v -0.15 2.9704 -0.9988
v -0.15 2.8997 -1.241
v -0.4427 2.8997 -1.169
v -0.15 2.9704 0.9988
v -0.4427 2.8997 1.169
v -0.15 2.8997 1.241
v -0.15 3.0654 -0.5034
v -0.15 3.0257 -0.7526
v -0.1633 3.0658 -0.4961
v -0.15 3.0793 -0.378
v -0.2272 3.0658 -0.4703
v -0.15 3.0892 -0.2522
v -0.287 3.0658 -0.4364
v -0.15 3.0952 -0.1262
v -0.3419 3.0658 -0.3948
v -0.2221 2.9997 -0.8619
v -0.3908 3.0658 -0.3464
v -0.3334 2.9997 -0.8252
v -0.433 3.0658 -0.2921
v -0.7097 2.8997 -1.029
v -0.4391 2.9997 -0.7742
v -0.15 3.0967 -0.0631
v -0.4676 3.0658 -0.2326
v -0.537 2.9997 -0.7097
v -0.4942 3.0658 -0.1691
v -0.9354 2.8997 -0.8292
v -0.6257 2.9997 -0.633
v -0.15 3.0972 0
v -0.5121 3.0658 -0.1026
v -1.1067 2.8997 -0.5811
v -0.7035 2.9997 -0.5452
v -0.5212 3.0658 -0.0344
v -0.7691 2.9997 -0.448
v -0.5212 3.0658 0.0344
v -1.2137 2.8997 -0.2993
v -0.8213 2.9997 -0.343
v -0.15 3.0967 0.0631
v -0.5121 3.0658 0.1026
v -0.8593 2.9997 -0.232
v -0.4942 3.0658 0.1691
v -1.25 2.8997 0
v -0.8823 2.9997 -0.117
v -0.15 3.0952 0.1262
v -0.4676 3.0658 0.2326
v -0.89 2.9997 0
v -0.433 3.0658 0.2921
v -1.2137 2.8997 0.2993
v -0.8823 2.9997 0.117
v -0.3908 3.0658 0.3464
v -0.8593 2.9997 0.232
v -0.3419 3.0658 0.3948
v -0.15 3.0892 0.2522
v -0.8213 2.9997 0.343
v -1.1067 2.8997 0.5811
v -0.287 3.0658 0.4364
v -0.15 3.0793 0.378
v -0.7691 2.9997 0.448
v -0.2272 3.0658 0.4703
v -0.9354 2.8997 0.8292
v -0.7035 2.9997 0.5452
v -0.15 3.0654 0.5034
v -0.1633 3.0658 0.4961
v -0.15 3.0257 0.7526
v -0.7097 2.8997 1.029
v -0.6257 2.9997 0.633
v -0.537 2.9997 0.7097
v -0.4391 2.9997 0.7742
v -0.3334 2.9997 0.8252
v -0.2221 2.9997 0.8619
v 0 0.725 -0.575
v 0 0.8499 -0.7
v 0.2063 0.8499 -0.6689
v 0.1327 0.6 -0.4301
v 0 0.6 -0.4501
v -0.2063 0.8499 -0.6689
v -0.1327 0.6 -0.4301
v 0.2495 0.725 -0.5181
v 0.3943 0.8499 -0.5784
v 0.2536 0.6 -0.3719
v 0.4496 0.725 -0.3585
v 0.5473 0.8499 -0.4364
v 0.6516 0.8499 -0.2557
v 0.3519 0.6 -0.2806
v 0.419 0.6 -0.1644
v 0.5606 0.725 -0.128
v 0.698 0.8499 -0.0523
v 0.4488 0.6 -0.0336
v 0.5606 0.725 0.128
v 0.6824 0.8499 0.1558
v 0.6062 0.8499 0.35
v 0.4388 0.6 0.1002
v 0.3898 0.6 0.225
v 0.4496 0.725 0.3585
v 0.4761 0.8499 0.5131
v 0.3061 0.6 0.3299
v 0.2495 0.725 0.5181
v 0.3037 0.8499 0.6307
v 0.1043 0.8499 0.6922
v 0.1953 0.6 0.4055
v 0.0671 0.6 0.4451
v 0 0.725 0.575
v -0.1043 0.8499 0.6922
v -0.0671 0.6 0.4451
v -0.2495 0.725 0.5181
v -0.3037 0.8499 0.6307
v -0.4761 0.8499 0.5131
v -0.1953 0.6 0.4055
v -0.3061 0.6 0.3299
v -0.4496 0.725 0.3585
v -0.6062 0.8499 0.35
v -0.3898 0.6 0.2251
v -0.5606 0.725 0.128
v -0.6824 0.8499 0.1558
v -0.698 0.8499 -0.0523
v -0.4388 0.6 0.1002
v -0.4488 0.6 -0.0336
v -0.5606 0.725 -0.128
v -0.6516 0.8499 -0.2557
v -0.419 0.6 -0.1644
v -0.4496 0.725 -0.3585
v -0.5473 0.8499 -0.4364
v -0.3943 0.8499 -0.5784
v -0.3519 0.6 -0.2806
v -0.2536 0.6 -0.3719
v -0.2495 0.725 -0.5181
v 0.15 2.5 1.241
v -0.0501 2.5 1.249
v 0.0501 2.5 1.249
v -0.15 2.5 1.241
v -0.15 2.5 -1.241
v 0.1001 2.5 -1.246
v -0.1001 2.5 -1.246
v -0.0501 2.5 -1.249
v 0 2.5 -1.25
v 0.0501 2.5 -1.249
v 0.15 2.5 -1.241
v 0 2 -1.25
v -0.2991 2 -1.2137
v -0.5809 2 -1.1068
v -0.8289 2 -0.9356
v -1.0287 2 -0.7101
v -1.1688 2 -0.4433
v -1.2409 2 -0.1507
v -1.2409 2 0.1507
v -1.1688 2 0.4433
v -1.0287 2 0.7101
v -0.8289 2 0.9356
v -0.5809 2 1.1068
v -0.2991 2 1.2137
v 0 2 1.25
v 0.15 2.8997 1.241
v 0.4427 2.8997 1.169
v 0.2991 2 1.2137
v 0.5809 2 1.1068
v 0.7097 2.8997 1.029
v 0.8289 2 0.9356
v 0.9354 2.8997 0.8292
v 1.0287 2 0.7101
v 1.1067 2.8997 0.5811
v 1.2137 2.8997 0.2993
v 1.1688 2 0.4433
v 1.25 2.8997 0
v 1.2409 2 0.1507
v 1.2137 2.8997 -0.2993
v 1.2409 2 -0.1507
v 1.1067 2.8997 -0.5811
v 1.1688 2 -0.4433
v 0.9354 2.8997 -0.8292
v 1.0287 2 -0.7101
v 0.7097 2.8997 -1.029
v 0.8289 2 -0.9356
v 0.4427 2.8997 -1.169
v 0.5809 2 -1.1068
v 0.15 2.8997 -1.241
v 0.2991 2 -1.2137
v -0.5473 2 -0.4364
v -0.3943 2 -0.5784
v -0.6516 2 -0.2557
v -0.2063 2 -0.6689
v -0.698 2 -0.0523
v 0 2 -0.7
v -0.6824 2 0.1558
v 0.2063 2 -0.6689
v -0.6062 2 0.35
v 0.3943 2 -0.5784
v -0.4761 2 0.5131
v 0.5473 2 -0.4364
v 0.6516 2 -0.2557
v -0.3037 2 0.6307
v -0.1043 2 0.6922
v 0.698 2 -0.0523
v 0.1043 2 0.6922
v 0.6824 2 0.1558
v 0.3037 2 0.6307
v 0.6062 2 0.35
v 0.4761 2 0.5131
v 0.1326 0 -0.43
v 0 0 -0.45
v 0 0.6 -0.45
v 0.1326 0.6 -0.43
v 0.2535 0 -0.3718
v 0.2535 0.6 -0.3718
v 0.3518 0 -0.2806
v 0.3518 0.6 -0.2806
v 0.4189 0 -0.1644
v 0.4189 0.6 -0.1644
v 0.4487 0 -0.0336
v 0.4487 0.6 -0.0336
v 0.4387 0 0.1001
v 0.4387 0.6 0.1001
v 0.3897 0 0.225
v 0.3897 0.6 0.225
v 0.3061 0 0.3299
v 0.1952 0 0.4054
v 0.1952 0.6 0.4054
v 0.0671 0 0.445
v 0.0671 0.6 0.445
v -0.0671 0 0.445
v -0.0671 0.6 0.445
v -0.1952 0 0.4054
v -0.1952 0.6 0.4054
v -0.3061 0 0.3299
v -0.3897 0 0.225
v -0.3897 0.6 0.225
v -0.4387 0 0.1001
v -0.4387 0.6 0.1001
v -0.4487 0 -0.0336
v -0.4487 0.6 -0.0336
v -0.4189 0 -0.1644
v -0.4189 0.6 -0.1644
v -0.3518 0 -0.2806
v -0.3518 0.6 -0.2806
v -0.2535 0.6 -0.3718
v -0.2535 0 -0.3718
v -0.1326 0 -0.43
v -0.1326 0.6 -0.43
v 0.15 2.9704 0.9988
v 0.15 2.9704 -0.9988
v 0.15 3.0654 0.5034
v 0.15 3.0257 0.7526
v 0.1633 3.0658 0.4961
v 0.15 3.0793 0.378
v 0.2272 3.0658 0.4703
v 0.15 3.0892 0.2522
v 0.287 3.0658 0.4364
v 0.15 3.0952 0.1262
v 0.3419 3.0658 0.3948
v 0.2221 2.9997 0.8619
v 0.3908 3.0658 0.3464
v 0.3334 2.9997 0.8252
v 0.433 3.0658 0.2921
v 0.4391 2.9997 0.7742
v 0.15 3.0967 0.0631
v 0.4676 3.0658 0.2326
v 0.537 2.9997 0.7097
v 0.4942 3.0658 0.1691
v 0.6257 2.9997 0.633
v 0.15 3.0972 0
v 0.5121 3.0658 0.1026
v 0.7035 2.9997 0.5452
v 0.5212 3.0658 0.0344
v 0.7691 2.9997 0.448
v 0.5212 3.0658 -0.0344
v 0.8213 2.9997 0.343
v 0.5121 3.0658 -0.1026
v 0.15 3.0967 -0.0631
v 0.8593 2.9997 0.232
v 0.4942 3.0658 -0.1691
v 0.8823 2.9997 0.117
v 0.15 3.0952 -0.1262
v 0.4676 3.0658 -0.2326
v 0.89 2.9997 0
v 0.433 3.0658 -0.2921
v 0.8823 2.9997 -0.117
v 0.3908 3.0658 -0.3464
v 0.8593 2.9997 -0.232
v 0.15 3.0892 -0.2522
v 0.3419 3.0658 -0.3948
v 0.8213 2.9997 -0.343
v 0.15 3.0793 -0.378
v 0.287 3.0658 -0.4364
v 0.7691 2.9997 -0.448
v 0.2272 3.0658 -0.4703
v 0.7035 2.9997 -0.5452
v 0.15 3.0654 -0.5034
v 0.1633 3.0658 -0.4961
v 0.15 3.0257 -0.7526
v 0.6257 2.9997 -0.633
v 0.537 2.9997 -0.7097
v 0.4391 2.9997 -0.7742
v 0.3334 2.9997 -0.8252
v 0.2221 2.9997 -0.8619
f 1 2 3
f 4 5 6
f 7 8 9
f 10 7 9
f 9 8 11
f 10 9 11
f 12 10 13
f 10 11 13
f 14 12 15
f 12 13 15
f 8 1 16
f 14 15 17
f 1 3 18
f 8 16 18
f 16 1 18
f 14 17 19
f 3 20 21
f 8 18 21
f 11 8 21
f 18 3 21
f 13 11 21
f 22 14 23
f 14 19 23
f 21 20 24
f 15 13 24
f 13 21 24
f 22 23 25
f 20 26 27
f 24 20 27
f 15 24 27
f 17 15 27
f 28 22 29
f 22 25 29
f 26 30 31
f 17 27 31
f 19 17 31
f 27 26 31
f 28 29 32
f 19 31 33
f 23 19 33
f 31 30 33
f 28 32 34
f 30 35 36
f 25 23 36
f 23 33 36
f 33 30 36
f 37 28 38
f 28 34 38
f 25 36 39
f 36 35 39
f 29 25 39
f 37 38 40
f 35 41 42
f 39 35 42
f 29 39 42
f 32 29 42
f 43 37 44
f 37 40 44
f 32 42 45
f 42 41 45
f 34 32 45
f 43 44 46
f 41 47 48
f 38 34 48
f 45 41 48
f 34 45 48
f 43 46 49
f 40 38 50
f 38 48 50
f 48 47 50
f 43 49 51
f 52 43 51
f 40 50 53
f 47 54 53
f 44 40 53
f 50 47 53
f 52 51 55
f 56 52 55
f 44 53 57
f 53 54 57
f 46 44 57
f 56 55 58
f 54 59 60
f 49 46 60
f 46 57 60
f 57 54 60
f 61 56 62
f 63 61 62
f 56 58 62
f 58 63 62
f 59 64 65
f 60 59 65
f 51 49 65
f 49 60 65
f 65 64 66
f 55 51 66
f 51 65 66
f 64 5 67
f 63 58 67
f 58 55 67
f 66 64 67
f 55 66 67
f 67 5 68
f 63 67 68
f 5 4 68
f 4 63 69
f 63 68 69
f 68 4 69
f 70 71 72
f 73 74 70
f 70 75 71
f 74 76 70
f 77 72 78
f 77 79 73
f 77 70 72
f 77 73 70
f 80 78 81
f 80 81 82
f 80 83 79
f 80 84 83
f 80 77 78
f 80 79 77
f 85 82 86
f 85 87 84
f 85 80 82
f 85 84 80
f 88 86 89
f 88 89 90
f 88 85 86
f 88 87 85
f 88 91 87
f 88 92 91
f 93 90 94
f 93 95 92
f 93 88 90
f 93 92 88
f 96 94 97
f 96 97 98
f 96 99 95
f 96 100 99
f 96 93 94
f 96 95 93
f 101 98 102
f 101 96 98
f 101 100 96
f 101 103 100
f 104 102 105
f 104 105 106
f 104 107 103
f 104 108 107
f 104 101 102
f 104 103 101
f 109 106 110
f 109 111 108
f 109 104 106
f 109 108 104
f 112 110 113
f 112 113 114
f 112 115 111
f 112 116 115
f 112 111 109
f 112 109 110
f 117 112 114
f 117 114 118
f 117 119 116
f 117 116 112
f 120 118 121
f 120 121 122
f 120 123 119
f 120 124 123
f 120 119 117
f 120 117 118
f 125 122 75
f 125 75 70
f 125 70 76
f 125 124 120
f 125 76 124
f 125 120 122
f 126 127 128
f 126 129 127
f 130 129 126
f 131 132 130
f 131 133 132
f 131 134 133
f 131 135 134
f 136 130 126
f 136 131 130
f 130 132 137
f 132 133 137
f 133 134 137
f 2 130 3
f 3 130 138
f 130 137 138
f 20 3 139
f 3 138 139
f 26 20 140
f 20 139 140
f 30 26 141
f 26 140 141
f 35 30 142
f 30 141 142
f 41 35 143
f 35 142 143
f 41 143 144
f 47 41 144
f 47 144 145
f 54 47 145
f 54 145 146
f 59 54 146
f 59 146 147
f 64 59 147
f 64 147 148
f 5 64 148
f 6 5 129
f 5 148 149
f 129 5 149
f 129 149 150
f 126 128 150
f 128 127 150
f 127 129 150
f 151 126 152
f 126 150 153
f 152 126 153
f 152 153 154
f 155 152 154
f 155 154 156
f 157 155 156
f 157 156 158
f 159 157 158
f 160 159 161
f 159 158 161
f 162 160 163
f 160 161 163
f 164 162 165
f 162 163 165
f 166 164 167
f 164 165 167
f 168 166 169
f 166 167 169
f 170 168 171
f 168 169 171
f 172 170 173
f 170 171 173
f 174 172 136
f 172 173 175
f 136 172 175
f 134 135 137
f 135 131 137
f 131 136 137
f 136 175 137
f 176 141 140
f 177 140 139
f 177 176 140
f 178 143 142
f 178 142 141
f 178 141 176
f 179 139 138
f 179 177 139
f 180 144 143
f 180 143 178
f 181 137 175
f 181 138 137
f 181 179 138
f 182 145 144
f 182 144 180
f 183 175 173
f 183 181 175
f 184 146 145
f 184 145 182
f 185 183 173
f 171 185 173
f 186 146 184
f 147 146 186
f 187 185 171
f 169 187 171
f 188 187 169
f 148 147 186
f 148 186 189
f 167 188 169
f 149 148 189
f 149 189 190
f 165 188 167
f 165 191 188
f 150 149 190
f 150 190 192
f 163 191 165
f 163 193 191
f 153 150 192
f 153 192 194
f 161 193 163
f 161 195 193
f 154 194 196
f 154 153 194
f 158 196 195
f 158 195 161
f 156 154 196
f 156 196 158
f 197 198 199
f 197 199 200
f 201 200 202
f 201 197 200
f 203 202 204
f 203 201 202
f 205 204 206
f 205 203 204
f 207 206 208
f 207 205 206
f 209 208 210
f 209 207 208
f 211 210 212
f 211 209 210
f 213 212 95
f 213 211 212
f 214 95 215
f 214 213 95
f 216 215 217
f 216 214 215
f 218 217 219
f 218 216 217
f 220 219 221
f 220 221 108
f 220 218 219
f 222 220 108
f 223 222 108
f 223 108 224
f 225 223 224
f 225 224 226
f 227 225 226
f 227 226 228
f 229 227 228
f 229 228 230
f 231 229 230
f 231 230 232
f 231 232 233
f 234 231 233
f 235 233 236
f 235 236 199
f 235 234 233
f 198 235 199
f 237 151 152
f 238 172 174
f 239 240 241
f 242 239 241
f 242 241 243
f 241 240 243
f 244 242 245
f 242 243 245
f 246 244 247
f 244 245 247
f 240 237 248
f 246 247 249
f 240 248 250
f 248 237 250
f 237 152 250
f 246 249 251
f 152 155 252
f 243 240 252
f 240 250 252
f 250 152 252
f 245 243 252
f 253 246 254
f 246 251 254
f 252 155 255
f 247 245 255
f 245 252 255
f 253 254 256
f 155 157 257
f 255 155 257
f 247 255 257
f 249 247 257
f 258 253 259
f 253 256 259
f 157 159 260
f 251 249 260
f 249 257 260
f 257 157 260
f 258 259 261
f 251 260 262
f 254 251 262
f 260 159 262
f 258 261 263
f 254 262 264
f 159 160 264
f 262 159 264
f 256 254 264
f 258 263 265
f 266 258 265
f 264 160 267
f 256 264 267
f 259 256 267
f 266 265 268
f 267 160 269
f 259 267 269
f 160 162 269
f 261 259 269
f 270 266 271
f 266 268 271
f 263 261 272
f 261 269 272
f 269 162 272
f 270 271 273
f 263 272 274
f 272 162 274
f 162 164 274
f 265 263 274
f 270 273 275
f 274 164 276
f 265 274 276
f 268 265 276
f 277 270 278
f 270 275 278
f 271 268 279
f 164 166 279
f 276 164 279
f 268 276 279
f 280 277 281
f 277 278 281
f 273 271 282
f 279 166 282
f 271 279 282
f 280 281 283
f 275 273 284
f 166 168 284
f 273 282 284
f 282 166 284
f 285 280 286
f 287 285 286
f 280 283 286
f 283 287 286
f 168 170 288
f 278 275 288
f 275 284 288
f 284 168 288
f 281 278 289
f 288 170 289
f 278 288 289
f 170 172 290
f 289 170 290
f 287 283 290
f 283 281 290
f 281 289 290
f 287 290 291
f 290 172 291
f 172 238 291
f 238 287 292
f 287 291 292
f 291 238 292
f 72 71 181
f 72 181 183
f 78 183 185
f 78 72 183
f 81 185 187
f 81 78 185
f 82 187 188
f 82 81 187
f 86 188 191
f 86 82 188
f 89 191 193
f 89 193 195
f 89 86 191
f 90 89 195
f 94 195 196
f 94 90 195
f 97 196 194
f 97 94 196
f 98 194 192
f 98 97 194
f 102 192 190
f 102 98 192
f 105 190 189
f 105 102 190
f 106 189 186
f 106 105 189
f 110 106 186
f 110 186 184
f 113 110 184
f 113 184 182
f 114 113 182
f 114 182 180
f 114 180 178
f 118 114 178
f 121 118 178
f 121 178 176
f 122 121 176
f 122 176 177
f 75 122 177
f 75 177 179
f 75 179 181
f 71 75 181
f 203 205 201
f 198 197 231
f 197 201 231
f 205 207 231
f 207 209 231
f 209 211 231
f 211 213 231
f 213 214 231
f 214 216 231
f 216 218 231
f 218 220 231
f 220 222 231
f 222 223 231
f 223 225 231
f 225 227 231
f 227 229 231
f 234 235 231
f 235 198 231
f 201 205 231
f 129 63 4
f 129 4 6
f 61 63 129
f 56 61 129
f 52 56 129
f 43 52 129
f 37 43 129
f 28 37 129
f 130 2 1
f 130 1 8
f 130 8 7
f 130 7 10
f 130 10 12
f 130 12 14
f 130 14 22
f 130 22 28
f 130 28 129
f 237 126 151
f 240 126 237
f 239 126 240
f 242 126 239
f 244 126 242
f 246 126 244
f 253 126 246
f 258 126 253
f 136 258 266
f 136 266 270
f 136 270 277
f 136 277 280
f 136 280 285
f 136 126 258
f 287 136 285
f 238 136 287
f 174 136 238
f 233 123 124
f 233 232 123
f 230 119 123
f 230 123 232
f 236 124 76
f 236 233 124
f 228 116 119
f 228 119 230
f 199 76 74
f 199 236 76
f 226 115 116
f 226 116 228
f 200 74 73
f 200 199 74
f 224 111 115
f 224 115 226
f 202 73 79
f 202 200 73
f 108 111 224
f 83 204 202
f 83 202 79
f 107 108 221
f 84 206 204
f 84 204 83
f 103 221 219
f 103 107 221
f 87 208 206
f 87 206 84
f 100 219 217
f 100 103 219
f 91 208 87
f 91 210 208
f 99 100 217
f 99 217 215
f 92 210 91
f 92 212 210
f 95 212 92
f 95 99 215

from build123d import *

# Parameters (mm, degrees)
SKETCH1_R               = 1.25
BOSS_EXTRUDE1_DEPTH     = 3.1
SKETCH3_OUTSIDE_W       = 5.44
SKETCH3_OUTSIDE_H       = 5.44
SKETCH3_OUTSIDE_R       = 0.7
CUT_EXTRUDE1_DEPTH      = 2
SKETCH4_OUTSIDE_W       = 5.44
SKETCH4_OUTSIDE_H       = 5.44
SKETCH4_OUTSIDE_R       = 0.45
CUT_EXTRUDE2_DEPTH      = 0.6
CHAMFER1_SIZE           = 0.25
CUT_EXTRUDE3_DEPTH      = 4.568613176
CUT_EXTRUDE3_DEPTH_BACK = 4.568613176


with BuildPart() as part:
    # Sketch1 → Boss-Extrude1 (new body)
    with BuildSketch(Plane(origin=(0, 0, 0), x_dir=(1, 0, 0), z_dir=(0, 1, 0))):
        with Locations(Location((0, 0, 0), (0, 0, 90))):
            Circle(SKETCH1_R)
    extrude(amount=BOSS_EXTRUDE1_DEPTH)

    # Sketch2 → Cut-Revolve1 (revolve, cut)
    with BuildSketch(Plane.XY, mode=Mode.PRIVATE) as cut_revolve1_sk:
        with BuildLine():
            Line((1.25, 2.899671038), (1.25, 3.3))
            Line((1.25, 3.3), (0, 3.3))
            Line((0, 3.3), (0, 3.1))
            ThreePointArc((0, 3.1), (0.632975452, 3.049600243), (1.25, 2.899671038))
        make_face()
    revolve(cut_revolve1_sk.sketch.rotate(Axis((0, 0, 0), (0, 1, 0)), 90), axis=Axis((0, 0, 0), (0, 1, 0)), mode=Mode.SUBTRACT)

    # Sketch3 outside → Cut-Extrude1 (cut)
    with BuildSketch(Plane.XZ):
        Rectangle(SKETCH3_OUTSIDE_W, SKETCH3_OUTSIDE_H)
        with Locations(Location((0, 0, 0), (0, 0, 270))):
            Circle(SKETCH3_OUTSIDE_R, mode=Mode.SUBTRACT)
    extrude(amount=-CUT_EXTRUDE1_DEPTH, mode=Mode.SUBTRACT)

    # Sketch4 outside → Cut-Extrude2 (cut)
    with BuildSketch(Plane.XZ):
        Rectangle(SKETCH4_OUTSIDE_W, SKETCH4_OUTSIDE_H)
        with Locations(Location((0, 0, 0), (0, 0, 270))):
            Circle(SKETCH4_OUTSIDE_R, mode=Mode.SUBTRACT)
    extrude(amount=-CUT_EXTRUDE2_DEPTH, mode=Mode.SUBTRACT)

    # Chamfer1
    chamfer1_edges = [part.edges().sort_by_distance(p)[0] for p in [
        (0, 0.6, 0.7),
    ]]
    chamfer(chamfer1_edges, length=CHAMFER1_SIZE - 0.0001)  # a hair under: the kernel refuses the full size

    # Sketch5 → Cut-Extrude3 (cut, two sides: drawn at the far end of the back side and taken through both)
    with BuildSketch(Plane.XY.offset(-CUT_EXTRUDE3_DEPTH_BACK)):
        with BuildLine():
            Line((-0.15, 3.097186511), (-0.15, 2.5))
            Line((-0.15, 2.5), (0.15, 2.5))
            Line((0.15, 2.5), (0.15, 3.097186511))
            ThreePointArc((0.15, 3.097186511), (0, 3.1), (-0.15, 3.097186511))
        make_face()
    extrude(amount=CUT_EXTRUDE3_DEPTH + CUT_EXTRUDE3_DEPTH_BACK, mode=Mode.SUBTRACT)


solid = part.part
